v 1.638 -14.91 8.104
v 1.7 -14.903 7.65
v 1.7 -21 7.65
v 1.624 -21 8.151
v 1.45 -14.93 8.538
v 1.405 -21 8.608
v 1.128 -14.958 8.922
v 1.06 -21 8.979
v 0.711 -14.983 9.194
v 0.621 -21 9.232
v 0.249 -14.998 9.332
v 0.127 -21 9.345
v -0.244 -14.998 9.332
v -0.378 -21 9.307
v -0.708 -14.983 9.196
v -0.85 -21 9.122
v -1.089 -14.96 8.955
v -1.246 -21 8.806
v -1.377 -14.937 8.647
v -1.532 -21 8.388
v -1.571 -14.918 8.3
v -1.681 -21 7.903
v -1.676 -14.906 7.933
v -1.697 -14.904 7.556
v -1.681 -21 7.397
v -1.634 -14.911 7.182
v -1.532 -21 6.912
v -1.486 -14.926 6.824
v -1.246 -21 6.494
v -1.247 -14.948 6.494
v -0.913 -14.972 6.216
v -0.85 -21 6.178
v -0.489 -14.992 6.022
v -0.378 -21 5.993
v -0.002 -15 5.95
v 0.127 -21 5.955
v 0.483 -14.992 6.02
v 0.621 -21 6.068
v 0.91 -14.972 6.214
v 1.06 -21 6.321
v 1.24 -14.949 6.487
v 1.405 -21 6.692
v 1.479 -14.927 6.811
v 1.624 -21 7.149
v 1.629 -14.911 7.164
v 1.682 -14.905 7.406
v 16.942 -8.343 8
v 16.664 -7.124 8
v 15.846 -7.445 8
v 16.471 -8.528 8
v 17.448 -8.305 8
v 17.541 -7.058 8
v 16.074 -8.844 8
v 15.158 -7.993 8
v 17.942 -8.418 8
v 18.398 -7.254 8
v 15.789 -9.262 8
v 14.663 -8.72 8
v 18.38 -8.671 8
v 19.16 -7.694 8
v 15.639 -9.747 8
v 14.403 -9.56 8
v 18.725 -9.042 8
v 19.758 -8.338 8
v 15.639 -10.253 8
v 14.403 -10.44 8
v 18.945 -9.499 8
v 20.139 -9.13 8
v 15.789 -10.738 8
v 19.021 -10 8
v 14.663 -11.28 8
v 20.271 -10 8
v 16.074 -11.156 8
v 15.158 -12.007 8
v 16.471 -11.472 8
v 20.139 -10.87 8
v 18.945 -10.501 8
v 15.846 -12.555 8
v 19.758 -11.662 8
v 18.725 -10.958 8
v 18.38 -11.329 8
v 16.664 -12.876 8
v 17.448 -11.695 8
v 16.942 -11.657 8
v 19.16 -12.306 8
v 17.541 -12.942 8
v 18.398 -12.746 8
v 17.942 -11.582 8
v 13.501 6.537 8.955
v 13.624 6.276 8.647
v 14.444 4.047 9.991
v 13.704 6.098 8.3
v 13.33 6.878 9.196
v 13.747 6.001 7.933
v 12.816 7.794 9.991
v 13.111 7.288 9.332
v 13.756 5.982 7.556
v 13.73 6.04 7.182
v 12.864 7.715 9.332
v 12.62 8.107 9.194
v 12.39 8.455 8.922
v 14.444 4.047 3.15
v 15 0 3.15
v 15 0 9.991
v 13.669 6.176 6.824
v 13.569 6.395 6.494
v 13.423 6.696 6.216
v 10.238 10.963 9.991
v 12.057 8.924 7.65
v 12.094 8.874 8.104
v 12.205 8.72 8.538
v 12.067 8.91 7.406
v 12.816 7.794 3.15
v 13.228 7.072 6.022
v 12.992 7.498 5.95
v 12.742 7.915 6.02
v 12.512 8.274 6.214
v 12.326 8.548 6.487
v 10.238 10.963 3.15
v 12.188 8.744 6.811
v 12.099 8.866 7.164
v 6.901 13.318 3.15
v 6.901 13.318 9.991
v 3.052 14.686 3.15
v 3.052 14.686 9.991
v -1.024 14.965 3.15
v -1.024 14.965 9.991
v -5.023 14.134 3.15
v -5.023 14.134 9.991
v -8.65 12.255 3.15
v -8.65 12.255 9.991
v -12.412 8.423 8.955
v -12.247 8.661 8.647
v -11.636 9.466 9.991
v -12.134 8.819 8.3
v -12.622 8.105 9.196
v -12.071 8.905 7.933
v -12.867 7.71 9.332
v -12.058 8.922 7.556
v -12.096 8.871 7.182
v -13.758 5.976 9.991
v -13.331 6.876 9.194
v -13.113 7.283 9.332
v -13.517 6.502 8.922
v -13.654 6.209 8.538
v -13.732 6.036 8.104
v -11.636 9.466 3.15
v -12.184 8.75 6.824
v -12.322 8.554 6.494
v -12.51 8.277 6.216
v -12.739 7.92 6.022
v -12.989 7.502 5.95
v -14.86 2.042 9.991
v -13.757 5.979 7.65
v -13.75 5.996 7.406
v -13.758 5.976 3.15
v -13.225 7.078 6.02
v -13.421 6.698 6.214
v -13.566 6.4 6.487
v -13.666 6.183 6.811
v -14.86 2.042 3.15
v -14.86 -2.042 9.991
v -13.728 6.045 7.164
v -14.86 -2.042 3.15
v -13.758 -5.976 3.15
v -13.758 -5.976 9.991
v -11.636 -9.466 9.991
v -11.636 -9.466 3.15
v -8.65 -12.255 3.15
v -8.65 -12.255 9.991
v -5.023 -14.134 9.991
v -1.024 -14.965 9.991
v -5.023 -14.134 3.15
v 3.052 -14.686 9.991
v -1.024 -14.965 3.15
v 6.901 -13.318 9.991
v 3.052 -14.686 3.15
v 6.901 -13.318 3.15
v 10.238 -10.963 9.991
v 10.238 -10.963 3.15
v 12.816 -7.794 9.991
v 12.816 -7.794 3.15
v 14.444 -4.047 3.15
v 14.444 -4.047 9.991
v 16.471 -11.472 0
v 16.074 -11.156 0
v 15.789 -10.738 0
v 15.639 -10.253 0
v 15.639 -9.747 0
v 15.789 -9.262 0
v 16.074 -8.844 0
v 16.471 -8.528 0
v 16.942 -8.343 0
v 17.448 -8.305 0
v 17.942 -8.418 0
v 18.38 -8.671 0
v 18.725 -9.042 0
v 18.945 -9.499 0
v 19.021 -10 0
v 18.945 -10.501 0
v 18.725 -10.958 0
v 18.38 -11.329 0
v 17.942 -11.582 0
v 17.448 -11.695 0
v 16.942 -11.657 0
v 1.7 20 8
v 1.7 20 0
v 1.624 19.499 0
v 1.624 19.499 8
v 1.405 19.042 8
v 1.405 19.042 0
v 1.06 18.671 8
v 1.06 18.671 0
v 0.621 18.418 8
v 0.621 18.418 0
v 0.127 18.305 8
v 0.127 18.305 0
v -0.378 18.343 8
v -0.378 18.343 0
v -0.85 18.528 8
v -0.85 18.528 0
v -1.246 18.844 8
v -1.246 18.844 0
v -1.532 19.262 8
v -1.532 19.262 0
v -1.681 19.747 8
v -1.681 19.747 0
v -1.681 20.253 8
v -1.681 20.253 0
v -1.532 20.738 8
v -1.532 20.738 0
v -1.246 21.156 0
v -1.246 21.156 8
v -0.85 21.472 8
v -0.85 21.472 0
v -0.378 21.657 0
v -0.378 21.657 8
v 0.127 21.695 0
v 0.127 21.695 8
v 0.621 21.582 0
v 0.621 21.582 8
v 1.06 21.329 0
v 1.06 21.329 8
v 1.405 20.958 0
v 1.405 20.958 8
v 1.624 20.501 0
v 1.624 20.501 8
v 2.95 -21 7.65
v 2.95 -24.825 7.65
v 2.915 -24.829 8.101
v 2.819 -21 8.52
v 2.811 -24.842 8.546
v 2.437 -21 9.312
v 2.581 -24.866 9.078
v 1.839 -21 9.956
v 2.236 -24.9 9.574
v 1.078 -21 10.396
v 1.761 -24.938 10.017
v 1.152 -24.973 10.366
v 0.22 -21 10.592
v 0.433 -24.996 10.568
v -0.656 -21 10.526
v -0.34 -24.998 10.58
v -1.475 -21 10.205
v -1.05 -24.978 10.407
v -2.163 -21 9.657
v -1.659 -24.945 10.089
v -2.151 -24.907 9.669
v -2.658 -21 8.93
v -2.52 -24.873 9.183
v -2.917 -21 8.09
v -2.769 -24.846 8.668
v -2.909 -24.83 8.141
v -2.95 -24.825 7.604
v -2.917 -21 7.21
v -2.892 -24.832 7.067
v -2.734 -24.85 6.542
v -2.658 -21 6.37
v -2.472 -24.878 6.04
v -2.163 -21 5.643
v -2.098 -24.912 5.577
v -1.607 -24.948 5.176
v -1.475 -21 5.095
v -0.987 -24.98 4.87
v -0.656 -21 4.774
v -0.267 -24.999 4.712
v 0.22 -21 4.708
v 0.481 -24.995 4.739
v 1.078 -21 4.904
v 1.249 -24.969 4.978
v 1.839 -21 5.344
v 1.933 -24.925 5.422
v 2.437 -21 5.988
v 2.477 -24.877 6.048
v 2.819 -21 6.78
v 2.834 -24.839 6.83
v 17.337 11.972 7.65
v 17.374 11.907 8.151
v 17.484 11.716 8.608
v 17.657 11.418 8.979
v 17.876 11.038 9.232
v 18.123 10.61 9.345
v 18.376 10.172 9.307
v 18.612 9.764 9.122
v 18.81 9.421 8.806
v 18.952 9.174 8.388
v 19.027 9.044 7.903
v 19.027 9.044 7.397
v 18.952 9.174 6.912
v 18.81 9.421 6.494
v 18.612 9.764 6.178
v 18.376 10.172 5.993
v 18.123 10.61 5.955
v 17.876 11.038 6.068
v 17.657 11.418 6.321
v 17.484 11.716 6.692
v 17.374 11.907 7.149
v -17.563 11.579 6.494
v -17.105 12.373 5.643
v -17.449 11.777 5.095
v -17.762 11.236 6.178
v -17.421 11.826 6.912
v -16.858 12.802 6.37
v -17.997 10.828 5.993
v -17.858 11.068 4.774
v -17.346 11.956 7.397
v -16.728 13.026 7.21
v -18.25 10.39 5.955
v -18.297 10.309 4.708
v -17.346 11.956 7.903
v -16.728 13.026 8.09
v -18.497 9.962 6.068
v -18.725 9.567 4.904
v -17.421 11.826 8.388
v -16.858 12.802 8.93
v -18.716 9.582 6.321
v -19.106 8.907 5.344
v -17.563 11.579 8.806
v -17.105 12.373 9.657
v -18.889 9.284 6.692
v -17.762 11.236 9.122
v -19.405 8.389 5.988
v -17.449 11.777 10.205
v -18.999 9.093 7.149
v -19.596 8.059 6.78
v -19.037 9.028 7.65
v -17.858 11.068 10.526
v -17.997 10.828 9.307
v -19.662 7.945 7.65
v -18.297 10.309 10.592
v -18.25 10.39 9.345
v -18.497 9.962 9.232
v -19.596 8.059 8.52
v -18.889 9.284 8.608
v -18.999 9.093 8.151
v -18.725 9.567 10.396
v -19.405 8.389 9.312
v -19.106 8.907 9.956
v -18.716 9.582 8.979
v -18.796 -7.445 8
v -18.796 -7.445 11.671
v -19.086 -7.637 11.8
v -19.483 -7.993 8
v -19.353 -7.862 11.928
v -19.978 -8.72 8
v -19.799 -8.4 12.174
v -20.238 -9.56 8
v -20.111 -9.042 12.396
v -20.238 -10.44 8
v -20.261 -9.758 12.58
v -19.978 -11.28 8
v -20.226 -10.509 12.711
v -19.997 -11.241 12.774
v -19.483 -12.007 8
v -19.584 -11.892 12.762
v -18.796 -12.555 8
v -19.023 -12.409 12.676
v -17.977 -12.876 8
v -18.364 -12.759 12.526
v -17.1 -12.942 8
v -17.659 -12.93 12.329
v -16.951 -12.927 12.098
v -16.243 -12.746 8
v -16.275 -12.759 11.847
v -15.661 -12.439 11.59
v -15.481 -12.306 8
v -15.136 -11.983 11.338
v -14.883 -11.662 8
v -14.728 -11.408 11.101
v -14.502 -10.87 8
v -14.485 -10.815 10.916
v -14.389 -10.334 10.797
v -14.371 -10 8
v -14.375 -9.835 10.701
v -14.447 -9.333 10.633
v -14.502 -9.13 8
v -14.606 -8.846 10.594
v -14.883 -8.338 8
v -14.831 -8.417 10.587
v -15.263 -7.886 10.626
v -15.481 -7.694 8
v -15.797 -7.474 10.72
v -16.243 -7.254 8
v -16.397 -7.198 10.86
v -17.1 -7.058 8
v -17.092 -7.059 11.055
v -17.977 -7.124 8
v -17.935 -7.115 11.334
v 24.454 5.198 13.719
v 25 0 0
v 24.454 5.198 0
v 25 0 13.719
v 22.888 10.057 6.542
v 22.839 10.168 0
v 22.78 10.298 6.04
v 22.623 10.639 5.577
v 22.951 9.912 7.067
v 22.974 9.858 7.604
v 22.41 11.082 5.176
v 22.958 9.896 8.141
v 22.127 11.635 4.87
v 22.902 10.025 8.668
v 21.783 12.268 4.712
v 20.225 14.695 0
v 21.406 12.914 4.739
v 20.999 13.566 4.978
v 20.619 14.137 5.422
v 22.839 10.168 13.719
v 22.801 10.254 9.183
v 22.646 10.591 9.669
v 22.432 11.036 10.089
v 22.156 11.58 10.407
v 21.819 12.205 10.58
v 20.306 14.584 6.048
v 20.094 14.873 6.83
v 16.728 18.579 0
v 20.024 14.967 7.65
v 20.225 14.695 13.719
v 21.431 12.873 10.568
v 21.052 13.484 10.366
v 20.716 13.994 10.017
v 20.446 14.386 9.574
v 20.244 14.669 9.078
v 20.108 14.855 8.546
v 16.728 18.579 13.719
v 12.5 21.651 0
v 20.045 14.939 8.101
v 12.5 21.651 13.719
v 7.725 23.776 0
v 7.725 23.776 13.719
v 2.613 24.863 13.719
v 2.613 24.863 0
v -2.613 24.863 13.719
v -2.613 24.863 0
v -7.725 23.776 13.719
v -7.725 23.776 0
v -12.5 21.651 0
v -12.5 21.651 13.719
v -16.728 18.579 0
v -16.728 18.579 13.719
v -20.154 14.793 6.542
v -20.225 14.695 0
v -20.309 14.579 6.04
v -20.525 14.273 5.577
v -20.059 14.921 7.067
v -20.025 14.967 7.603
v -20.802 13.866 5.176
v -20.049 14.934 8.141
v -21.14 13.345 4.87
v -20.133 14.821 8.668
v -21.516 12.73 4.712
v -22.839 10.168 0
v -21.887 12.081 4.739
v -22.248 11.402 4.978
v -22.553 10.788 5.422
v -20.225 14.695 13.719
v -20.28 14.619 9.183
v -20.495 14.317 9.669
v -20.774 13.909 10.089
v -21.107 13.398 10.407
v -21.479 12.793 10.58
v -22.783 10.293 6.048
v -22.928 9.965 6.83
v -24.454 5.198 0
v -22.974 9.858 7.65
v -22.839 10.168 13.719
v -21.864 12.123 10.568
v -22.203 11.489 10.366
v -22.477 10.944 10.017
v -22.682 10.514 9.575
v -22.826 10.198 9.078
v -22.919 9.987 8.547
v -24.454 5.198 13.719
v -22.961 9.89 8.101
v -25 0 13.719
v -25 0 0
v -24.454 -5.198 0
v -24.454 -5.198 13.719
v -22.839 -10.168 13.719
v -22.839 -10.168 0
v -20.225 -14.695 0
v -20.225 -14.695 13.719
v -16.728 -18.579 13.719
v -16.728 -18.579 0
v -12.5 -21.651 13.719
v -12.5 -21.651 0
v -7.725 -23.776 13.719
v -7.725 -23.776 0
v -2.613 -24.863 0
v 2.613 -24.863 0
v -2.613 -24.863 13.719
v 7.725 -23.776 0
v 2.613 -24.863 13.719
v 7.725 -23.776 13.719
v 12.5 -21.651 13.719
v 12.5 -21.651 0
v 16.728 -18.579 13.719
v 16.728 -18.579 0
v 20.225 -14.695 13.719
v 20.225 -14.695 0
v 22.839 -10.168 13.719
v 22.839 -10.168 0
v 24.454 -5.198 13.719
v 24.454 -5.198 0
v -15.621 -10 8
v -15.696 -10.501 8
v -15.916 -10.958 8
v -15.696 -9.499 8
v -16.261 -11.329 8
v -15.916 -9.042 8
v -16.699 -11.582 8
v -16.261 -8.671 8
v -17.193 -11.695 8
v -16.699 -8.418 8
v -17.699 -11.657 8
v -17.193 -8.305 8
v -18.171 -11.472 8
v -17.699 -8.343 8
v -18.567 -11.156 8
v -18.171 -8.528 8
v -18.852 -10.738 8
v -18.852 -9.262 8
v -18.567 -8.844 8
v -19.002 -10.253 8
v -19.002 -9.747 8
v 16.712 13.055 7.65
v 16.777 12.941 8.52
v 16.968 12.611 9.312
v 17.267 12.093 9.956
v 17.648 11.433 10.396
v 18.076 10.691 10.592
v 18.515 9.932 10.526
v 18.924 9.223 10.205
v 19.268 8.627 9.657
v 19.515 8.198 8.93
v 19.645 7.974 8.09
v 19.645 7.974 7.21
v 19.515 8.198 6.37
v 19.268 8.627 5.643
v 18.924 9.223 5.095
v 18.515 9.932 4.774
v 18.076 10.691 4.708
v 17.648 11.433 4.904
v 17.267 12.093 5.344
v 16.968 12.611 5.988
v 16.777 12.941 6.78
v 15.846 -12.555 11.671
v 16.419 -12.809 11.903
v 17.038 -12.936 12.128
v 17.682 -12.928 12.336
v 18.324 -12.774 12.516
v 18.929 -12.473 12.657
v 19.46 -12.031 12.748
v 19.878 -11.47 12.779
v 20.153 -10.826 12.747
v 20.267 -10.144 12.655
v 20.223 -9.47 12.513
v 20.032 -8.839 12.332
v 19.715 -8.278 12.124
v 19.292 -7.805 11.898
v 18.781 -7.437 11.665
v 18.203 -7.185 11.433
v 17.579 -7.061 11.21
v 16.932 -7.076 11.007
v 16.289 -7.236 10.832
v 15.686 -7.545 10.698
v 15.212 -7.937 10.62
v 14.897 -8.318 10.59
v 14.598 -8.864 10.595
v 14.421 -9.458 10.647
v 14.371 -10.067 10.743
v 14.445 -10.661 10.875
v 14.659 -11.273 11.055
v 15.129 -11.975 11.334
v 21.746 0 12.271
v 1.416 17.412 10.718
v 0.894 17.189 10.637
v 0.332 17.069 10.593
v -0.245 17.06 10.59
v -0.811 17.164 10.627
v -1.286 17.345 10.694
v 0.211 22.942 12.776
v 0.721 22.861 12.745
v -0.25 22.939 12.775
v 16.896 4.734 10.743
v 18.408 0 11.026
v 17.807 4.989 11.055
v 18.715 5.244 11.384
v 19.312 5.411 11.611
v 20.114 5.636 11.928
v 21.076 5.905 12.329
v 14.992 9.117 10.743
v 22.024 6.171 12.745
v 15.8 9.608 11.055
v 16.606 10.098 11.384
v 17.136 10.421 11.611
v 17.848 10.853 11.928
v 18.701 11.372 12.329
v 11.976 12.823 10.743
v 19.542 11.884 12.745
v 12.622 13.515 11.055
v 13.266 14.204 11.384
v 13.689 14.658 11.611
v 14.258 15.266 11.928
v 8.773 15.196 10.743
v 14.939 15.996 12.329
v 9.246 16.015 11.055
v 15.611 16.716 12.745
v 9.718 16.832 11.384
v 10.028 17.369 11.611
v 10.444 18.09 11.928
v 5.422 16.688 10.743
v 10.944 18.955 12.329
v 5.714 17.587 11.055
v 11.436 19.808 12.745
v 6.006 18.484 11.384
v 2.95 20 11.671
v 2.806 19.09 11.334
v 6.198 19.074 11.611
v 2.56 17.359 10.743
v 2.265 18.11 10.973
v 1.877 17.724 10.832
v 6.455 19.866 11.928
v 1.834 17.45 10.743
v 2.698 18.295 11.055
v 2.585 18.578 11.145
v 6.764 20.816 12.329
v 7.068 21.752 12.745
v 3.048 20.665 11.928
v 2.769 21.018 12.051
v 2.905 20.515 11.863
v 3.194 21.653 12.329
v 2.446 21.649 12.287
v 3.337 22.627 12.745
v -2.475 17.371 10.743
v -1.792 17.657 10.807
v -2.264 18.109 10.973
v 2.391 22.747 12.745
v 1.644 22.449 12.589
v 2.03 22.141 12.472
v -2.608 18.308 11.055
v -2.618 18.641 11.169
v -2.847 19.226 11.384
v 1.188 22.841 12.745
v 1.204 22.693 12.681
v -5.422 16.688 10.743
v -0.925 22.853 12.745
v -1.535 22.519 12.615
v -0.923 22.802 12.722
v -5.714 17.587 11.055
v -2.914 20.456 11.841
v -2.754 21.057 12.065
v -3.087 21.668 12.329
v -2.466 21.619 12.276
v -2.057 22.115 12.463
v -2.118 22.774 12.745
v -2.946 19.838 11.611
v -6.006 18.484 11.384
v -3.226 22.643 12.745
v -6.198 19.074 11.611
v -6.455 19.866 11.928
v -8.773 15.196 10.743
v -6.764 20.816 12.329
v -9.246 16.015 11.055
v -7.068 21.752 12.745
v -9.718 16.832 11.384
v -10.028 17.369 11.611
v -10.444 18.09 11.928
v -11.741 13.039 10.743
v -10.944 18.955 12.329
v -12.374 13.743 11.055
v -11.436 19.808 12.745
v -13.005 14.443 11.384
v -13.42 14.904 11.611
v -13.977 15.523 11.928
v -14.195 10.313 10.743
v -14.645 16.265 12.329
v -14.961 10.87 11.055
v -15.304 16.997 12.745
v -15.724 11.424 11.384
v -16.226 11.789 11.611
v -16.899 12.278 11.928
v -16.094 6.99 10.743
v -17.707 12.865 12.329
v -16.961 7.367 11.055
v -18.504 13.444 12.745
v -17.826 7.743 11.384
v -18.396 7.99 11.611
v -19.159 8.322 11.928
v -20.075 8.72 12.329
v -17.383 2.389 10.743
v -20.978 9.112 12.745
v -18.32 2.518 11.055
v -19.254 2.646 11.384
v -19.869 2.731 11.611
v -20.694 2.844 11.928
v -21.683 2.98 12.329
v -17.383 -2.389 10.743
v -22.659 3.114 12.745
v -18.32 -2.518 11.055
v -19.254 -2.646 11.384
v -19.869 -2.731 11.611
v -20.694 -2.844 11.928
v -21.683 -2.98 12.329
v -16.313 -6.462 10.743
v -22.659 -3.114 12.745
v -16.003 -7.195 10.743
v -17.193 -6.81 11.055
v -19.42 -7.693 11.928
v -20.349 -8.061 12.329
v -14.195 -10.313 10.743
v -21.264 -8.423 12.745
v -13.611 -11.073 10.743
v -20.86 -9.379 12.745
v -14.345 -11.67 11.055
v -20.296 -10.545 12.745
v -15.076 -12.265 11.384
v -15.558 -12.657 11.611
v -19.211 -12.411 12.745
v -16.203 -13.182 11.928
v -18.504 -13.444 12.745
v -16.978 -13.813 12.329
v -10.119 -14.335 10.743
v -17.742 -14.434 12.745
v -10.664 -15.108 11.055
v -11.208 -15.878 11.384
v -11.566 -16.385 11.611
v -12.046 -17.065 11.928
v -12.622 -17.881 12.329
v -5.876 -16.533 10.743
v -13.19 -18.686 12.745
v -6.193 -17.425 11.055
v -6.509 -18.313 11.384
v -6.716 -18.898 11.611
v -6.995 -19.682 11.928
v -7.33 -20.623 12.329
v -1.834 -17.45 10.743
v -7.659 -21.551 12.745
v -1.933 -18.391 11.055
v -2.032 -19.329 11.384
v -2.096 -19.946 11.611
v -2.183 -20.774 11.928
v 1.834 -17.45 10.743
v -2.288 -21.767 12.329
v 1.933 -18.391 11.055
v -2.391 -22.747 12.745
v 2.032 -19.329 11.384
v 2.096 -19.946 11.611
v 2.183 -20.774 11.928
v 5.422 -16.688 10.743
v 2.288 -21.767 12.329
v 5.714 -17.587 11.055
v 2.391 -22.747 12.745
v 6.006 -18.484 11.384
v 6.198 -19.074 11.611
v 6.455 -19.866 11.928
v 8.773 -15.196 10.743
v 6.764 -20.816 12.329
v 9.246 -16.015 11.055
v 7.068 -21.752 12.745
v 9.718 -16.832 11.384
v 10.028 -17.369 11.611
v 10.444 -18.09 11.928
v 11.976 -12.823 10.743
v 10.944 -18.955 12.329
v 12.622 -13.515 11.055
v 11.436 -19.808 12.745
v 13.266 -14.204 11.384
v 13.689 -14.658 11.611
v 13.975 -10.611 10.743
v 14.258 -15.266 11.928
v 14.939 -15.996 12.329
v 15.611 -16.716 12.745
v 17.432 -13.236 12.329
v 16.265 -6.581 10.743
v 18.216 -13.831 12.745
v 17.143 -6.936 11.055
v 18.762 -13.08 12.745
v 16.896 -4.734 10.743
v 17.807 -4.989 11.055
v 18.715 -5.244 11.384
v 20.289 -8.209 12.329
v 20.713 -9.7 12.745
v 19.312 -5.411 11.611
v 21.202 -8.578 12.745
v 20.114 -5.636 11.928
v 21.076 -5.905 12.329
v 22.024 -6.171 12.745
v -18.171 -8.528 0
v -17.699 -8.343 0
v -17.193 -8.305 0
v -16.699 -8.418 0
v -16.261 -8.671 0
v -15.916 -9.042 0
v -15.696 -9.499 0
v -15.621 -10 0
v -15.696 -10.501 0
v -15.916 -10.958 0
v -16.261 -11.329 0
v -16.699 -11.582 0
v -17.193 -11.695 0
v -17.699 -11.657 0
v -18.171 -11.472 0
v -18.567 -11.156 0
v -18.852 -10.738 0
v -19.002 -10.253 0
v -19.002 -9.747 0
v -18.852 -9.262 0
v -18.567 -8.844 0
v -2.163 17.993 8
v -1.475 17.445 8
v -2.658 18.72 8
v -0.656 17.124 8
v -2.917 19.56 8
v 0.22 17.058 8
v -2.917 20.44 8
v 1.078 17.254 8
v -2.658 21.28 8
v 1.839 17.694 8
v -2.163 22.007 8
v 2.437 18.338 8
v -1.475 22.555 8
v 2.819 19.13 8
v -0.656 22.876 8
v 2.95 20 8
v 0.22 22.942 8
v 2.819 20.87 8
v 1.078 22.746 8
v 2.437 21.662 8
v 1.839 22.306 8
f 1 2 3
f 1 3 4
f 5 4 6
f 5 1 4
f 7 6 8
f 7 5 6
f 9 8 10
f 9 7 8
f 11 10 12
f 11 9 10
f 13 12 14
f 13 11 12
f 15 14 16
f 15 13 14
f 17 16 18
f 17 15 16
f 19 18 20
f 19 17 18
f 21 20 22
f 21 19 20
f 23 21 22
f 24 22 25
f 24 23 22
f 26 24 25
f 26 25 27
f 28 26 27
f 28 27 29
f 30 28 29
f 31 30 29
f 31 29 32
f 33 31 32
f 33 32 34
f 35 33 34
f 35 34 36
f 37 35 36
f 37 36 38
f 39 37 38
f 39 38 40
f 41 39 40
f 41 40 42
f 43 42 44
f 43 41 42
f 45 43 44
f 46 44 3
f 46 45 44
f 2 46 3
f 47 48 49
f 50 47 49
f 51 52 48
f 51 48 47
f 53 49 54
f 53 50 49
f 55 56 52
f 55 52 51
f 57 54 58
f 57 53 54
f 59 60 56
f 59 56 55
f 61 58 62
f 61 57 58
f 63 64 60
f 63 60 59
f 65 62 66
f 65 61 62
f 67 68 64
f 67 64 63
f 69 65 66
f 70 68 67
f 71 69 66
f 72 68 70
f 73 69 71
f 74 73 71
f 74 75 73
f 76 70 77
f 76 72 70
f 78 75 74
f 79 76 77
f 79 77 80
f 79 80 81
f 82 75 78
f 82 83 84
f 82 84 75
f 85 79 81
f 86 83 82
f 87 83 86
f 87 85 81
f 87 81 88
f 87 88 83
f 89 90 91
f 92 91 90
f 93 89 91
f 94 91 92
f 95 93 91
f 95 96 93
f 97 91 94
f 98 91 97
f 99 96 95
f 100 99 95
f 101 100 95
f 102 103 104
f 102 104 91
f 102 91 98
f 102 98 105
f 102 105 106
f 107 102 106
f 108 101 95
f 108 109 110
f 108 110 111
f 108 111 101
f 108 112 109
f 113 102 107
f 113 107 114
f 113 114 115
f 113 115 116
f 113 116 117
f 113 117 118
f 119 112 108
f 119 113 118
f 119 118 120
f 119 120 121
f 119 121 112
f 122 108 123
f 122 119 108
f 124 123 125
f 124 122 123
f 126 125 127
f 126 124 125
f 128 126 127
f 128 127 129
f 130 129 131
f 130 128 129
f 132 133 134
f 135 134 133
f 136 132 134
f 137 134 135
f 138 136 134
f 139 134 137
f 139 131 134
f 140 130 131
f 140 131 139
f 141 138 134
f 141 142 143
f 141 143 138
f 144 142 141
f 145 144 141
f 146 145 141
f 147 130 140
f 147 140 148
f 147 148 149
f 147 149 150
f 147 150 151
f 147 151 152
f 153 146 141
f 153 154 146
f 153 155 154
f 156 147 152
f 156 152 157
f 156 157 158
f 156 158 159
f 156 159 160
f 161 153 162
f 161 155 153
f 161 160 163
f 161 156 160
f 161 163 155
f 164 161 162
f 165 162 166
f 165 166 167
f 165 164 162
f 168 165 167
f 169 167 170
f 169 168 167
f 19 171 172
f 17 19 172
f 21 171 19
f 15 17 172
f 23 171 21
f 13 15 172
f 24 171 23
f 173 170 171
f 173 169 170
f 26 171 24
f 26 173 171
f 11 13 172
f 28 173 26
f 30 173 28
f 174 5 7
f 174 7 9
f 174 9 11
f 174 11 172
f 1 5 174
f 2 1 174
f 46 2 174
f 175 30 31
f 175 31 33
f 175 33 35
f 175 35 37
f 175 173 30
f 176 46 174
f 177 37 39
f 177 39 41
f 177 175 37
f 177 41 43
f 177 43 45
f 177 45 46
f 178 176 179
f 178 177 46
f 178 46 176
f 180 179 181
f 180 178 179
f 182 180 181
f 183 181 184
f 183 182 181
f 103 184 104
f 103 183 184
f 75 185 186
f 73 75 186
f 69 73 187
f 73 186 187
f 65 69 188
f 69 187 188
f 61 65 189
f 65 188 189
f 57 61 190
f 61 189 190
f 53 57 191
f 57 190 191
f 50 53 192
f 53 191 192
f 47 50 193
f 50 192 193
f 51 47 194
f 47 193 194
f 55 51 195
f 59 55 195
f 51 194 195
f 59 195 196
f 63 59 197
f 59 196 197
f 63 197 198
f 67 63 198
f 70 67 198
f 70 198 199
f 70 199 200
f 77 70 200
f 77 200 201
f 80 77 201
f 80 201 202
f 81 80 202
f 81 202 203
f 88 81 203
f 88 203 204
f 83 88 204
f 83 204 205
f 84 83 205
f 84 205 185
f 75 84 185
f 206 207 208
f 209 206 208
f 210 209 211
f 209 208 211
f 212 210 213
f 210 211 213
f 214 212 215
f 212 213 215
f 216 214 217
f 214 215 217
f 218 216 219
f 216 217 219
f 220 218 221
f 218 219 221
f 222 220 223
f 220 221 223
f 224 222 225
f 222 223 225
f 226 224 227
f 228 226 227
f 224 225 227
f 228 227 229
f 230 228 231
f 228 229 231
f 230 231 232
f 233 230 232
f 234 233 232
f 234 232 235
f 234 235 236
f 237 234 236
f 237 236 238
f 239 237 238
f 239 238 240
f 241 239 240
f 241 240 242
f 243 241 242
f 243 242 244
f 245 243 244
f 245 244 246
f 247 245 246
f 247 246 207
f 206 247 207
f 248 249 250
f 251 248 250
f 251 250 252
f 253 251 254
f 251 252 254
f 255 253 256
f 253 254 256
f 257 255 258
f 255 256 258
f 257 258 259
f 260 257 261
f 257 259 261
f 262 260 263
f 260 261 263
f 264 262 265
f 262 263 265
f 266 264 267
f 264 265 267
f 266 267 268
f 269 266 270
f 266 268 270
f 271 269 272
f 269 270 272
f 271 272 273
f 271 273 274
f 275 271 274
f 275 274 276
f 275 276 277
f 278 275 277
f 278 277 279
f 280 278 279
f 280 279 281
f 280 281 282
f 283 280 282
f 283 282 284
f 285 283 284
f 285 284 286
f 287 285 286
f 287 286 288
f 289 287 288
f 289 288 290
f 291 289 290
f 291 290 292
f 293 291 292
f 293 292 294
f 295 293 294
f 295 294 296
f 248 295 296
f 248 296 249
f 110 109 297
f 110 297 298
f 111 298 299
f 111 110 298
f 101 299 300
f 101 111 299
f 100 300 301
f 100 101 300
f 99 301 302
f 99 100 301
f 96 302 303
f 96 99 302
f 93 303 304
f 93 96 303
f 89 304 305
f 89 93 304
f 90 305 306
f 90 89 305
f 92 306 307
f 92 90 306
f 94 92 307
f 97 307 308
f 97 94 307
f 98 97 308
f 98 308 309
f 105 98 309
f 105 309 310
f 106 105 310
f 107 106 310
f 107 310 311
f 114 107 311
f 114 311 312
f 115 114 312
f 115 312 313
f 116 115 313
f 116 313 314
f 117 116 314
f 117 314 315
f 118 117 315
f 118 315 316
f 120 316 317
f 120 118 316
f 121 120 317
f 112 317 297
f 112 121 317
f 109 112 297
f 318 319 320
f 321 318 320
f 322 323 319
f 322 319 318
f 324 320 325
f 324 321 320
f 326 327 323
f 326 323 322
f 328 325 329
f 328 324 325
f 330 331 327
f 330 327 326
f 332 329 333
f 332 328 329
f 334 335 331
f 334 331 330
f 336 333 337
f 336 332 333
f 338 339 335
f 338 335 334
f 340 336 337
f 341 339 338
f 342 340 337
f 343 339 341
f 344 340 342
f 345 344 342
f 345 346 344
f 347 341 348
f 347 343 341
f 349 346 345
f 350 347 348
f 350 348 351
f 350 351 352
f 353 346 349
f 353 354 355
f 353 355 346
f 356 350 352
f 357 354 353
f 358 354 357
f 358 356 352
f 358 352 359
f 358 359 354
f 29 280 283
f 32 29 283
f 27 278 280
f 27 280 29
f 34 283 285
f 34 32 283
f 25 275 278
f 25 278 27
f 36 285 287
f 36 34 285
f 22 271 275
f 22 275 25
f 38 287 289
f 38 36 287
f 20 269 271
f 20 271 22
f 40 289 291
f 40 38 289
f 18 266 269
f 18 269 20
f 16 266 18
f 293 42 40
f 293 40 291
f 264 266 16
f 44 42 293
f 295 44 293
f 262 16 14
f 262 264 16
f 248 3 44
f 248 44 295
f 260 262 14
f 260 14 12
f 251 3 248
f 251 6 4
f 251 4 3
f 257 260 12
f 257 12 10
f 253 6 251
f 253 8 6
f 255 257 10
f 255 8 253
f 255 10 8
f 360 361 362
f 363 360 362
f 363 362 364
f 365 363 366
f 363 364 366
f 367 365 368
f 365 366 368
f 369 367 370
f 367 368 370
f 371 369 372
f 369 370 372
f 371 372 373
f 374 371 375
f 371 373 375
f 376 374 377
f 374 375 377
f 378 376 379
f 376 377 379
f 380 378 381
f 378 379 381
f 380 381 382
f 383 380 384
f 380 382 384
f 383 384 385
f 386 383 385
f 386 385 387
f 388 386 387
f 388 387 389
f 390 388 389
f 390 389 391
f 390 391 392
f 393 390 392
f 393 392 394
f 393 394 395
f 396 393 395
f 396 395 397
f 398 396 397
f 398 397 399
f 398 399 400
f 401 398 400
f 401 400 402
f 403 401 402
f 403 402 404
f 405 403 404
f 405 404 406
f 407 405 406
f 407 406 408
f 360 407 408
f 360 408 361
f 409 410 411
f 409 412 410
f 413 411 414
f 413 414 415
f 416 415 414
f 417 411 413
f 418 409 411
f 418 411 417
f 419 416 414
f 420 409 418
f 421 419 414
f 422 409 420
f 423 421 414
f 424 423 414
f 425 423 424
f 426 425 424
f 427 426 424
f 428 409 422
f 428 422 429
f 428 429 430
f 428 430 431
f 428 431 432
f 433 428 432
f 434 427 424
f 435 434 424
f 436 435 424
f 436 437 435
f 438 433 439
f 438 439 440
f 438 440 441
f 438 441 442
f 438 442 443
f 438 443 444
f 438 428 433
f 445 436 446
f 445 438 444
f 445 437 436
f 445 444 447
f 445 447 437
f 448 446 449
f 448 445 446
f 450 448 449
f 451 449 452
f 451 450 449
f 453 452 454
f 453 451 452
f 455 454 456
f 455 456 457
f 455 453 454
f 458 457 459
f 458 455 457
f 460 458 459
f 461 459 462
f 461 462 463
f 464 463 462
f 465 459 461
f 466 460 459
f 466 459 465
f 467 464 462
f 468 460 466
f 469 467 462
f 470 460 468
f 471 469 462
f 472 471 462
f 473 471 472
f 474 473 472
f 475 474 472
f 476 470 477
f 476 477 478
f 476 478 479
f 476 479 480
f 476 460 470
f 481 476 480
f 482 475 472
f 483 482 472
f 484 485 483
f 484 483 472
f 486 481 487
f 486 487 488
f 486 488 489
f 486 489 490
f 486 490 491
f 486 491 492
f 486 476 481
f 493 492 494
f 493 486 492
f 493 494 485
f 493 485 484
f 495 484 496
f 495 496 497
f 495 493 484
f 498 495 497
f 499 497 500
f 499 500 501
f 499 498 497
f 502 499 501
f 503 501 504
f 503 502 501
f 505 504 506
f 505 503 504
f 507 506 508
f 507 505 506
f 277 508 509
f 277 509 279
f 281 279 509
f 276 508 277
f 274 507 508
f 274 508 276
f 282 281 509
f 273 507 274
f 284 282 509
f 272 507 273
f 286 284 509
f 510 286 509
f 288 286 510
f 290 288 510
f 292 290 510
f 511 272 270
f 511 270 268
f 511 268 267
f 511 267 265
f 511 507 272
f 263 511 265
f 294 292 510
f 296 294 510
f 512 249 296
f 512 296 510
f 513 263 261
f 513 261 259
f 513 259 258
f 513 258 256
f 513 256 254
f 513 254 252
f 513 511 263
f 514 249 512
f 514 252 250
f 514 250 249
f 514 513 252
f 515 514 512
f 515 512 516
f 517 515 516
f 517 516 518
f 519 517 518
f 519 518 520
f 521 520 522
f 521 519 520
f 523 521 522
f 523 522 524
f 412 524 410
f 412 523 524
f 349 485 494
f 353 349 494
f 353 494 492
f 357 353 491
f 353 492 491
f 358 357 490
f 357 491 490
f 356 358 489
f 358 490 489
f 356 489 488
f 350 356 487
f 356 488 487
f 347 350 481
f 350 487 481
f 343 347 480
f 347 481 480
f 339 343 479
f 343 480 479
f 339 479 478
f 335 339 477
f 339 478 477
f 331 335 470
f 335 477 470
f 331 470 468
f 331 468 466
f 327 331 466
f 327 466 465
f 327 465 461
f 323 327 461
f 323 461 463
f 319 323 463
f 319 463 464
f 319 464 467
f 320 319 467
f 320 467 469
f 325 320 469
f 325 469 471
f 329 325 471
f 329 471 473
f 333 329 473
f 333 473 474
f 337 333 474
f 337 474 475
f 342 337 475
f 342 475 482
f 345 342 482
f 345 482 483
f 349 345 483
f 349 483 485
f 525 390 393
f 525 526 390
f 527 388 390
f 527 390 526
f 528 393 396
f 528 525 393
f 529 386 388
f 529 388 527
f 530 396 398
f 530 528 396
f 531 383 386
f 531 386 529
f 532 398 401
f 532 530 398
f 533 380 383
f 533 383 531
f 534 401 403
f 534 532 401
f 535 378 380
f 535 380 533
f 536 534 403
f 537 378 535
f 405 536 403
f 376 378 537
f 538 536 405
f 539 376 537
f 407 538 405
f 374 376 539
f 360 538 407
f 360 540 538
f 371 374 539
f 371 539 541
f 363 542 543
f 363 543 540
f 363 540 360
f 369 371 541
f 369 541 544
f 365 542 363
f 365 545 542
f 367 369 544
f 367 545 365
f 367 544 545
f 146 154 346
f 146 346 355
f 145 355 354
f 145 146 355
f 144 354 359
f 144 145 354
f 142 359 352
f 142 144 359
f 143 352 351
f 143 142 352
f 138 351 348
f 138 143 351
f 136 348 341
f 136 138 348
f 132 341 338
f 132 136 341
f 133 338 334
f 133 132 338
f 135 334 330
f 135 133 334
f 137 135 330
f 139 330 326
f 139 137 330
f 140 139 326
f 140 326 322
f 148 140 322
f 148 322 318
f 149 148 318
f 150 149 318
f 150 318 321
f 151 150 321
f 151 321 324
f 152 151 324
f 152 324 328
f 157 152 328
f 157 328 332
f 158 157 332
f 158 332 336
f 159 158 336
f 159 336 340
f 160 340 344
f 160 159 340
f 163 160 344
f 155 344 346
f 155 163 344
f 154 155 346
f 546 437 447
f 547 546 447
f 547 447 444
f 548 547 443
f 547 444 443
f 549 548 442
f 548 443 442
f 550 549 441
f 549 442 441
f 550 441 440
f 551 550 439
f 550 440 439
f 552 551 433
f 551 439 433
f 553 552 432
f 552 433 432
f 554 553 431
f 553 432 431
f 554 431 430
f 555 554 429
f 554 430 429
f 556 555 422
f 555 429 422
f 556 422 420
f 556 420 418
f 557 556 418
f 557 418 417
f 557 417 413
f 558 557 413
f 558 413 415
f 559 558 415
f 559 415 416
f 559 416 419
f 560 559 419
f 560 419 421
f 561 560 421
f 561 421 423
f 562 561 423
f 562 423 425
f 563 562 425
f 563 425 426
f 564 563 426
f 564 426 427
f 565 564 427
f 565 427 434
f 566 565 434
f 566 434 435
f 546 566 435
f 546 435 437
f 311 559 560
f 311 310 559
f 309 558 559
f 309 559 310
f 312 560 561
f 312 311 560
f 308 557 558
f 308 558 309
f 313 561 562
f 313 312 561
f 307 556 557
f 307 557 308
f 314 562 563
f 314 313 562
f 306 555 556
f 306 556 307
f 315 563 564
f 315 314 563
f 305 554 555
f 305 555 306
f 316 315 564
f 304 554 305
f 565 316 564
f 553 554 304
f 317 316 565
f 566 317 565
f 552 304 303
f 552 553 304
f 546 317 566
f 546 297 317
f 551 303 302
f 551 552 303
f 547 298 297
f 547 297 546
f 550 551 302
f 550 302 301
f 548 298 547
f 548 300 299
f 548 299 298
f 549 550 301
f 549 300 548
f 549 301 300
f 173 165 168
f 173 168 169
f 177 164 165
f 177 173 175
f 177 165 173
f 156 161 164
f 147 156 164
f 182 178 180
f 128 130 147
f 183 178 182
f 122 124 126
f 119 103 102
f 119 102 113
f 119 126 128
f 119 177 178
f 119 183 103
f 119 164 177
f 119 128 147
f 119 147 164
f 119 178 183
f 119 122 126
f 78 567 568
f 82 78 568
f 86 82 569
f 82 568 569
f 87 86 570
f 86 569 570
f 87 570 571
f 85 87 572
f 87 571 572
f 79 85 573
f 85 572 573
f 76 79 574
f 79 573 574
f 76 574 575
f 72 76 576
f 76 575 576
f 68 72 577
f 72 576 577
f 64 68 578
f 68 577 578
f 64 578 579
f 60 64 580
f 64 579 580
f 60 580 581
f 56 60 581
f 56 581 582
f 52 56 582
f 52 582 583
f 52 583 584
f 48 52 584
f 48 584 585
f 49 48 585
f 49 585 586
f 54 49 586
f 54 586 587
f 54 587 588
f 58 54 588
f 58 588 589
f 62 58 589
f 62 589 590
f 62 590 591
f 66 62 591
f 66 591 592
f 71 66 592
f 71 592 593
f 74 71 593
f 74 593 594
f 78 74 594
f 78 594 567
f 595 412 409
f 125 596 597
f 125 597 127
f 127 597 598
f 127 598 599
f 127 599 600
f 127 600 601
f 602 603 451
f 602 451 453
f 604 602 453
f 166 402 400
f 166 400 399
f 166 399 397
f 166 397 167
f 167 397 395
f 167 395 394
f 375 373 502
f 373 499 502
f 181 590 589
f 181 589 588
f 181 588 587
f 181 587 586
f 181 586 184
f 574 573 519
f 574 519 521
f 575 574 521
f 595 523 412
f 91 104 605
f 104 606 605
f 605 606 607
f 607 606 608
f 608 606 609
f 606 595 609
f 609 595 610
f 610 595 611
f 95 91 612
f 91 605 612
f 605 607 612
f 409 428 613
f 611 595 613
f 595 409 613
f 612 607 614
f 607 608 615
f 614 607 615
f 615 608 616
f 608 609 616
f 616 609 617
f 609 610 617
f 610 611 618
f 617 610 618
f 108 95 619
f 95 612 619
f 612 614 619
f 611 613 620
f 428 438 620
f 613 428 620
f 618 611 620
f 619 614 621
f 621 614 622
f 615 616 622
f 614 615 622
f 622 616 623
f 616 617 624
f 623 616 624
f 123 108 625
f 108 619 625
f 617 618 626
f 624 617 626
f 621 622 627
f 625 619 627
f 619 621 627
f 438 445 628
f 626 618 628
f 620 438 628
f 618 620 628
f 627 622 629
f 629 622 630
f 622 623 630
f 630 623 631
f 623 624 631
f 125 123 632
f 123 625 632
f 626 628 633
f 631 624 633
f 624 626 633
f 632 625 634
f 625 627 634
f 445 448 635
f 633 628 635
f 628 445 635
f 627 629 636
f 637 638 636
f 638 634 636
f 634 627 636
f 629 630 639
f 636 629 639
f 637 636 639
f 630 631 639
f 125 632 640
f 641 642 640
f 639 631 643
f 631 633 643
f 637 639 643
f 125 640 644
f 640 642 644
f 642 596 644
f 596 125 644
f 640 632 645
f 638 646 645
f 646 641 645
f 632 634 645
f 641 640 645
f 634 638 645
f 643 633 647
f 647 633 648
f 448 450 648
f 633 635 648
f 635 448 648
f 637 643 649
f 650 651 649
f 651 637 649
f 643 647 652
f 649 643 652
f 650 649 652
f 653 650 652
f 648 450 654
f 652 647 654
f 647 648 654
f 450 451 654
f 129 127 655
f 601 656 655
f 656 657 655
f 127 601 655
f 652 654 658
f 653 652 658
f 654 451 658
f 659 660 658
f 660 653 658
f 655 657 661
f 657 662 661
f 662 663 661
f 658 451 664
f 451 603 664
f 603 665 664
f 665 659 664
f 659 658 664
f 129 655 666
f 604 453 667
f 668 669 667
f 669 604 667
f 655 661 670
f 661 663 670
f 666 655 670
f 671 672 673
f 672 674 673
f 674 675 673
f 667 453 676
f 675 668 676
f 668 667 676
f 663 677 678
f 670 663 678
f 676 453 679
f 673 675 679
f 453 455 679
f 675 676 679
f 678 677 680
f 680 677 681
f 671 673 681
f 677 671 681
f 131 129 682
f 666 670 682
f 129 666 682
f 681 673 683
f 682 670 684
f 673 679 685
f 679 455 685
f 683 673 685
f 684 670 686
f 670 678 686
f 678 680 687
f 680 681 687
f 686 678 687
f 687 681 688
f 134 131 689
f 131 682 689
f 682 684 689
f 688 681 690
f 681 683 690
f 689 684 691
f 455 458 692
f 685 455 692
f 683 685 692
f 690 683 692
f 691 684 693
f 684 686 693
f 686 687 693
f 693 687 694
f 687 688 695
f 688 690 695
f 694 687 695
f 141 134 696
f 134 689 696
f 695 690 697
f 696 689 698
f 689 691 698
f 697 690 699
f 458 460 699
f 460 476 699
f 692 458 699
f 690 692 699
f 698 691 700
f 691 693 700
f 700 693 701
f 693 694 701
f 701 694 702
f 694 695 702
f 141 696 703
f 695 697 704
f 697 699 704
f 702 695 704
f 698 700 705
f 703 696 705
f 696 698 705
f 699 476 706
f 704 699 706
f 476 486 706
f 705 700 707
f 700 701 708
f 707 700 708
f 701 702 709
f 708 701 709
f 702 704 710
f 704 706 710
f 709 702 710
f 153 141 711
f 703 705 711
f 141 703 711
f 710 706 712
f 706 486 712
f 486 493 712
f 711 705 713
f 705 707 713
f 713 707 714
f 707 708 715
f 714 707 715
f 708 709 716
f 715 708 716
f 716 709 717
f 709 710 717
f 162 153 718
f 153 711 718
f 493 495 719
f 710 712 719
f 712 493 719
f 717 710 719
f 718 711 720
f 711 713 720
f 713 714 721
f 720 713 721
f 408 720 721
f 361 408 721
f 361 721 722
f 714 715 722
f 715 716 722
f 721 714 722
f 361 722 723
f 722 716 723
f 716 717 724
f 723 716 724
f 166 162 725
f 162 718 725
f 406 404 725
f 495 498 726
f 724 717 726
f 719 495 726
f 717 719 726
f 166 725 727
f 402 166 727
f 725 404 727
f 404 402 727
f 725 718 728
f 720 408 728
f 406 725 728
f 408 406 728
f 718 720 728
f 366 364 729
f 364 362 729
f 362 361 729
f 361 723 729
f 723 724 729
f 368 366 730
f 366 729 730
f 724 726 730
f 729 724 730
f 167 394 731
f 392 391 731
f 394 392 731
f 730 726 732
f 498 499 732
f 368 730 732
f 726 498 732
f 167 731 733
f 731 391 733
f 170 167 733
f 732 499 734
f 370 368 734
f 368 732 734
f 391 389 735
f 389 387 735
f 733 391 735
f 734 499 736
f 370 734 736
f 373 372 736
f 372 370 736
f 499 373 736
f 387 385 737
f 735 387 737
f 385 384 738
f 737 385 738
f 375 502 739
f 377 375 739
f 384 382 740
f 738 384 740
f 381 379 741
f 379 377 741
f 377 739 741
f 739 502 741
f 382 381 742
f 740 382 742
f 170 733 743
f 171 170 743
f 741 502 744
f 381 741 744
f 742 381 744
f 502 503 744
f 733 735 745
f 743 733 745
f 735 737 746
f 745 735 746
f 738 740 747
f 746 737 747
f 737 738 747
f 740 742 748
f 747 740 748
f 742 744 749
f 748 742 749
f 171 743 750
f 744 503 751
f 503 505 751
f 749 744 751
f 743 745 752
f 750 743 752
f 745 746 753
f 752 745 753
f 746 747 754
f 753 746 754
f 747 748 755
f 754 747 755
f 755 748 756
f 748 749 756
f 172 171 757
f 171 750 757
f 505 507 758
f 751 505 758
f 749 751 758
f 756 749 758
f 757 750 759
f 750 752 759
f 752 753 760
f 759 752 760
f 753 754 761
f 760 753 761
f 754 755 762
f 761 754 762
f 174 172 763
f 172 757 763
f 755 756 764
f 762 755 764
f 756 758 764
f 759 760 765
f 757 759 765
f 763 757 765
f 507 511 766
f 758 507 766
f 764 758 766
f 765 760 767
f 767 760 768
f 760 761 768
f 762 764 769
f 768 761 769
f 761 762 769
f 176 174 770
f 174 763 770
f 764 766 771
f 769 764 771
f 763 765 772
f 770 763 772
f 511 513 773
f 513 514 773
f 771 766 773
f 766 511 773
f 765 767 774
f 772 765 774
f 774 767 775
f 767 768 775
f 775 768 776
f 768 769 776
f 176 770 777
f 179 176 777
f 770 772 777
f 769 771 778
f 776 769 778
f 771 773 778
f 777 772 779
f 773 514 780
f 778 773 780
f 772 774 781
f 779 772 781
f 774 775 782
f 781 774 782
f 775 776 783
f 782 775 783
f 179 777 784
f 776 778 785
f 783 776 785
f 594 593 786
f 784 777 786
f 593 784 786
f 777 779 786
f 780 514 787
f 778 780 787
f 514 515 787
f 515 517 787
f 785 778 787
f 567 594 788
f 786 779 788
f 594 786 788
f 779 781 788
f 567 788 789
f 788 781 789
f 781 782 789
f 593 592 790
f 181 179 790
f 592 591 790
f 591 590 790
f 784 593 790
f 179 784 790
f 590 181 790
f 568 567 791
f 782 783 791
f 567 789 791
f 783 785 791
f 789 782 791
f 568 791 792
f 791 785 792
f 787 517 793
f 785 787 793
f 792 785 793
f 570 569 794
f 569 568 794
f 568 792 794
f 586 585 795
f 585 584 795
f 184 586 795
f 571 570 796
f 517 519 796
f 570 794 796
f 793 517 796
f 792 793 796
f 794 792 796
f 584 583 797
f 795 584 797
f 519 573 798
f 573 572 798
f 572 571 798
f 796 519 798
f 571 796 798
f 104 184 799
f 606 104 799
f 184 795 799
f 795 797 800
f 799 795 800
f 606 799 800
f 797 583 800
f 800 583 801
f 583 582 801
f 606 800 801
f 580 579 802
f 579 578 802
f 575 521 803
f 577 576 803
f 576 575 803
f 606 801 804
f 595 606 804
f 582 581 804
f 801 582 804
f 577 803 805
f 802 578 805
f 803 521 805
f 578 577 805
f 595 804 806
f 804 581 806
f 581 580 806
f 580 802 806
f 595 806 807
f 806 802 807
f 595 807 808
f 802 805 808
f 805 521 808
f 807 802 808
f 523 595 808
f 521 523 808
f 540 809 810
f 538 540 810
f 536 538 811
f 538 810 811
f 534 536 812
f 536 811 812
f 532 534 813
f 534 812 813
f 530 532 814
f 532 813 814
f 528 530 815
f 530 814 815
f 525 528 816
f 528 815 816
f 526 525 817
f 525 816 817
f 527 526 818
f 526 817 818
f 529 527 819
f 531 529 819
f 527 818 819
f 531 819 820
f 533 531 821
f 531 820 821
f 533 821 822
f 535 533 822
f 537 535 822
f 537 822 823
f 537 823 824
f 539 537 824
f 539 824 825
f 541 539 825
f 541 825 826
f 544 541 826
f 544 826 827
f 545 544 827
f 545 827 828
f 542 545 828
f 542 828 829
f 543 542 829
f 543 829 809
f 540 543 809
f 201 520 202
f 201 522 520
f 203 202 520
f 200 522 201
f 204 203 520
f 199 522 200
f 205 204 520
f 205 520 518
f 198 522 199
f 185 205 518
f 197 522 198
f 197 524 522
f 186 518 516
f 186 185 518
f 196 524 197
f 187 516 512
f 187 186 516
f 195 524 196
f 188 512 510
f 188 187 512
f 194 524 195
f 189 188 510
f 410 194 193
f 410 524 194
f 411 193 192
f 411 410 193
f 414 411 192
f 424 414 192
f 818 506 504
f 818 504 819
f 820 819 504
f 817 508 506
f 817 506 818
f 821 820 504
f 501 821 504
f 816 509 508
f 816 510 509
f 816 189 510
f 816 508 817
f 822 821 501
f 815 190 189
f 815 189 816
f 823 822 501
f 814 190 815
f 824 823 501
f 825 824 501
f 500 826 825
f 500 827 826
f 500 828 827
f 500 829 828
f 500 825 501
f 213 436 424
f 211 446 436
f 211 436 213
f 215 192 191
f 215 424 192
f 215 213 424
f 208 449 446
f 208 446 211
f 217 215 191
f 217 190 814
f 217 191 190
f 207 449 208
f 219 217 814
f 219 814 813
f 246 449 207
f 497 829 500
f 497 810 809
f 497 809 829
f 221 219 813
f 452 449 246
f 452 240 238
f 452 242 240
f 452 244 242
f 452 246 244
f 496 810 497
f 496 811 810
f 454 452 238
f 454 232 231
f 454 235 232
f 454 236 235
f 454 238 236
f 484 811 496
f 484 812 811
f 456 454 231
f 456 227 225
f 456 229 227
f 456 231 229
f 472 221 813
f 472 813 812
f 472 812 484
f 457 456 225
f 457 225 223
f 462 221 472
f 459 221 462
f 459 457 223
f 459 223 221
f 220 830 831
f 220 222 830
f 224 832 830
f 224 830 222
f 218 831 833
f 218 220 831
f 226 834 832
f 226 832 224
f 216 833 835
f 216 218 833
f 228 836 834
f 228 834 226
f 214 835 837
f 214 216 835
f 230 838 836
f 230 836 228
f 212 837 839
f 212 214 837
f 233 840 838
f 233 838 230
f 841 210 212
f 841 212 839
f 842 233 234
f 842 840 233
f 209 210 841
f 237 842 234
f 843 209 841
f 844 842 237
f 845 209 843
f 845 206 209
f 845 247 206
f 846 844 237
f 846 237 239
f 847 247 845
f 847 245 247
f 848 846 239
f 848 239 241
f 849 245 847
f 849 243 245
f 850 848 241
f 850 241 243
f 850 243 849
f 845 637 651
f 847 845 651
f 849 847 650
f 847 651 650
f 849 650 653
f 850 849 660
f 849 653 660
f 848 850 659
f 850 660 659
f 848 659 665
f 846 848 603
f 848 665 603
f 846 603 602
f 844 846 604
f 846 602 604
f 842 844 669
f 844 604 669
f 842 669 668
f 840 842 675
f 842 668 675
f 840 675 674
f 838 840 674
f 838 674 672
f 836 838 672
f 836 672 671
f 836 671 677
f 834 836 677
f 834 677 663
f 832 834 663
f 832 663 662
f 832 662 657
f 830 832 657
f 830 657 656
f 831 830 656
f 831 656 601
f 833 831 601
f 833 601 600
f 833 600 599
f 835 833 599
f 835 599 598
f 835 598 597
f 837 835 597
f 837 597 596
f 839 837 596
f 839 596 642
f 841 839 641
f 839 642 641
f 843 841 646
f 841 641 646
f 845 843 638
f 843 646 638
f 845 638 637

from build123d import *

# Parameters (mm, degrees)
SKETCH001_R        = 1.7
POCKET_DEPTH       = 157.778767
SKETCH002_R        = 2.95
POCKET001_DEPTH    = 6
SKETCH003_R        = 1.7
POCKET002_DEPTH    = 169.059555
SKETCH004_R        = 2.95
POCKET003_DEPTH    = 4
POLARPATTERN_COUNT = 3


with BuildPart() as part:
    # Sketch → Revolution (revolve)
    with BuildSketch(Plane.XZ):
        with BuildLine():
            Line((15, 9.990992), (15, 3.15))
            Line((15, 3.15), (0, 3.15))
            Line((0, 3.15), (0, 0))
            Line((0, 0), (25, 0))
            Line((25, 0), (25, 13.719212))
            ThreePointArc((15, 9.990992), (20.086685, 11.622592), (25, 13.719212))
        make_face()
    revolve(axis=Axis((0, 0, 0), (0, 0, 1)))

    # Sketch001 (on Face3 of Revolution) → Pocket (cut, through all)
    with BuildSketch(Plane(origin=(0, 0, 0), x_dir=(1, 0, 0), z_dir=(0, 0, -1))):
        with Locations((0, -20)):
            Circle(SKETCH001_R)
    pocket = extrude(amount=-POCKET_DEPTH, mode=Mode.SUBTRACT)

    # Sketch002 (on DatumPlane) → Pocket001 (cut)
    with BuildSketch(Plane.XY.offset(14)):
        with Locations((0, 20)):
            Circle(SKETCH002_R)
    pocket001 = extrude(amount=-POCKET001_DEPTH, mode=Mode.SUBTRACT)

    # Sketch003 → Pocket002 (cut, through all)
    with BuildSketch(Plane.XZ):
        with Locations((0, 7.65)):
            Circle(SKETCH003_R)
    pocket002 = extrude(amount=POCKET002_DEPTH, mode=Mode.SUBTRACT)

    # Sketch004 (on DatumPlane) → Pocket003 (cut)
    with BuildSketch(Plane.XZ.offset(25)):
        with Locations((0, 7.65)):
            Circle(SKETCH004_R)
    pocket003 = extrude(amount=-POCKET003_DEPTH, mode=Mode.SUBTRACT)

    # PolarPattern: Pocket, Pocket001, Pocket002, Pocket003 ×3 about axis
    polarpattern_axis = Axis((0, 0, 0), (0, 0, -1))
    for i in range(1, POLARPATTERN_COUNT):
        add(pocket.rotate(polarpattern_axis, i * 360 / POLARPATTERN_COUNT), mode=Mode.SUBTRACT)
        add(pocket001.rotate(polarpattern_axis, i * 360 / POLARPATTERN_COUNT), mode=Mode.SUBTRACT)
        add(pocket002.rotate(polarpattern_axis, i * 360 / POLARPATTERN_COUNT), mode=Mode.SUBTRACT)
        add(pocket003.rotate(polarpattern_axis, i * 360 / POLARPATTERN_COUNT), mode=Mode.SUBTRACT)


solid = part.part
